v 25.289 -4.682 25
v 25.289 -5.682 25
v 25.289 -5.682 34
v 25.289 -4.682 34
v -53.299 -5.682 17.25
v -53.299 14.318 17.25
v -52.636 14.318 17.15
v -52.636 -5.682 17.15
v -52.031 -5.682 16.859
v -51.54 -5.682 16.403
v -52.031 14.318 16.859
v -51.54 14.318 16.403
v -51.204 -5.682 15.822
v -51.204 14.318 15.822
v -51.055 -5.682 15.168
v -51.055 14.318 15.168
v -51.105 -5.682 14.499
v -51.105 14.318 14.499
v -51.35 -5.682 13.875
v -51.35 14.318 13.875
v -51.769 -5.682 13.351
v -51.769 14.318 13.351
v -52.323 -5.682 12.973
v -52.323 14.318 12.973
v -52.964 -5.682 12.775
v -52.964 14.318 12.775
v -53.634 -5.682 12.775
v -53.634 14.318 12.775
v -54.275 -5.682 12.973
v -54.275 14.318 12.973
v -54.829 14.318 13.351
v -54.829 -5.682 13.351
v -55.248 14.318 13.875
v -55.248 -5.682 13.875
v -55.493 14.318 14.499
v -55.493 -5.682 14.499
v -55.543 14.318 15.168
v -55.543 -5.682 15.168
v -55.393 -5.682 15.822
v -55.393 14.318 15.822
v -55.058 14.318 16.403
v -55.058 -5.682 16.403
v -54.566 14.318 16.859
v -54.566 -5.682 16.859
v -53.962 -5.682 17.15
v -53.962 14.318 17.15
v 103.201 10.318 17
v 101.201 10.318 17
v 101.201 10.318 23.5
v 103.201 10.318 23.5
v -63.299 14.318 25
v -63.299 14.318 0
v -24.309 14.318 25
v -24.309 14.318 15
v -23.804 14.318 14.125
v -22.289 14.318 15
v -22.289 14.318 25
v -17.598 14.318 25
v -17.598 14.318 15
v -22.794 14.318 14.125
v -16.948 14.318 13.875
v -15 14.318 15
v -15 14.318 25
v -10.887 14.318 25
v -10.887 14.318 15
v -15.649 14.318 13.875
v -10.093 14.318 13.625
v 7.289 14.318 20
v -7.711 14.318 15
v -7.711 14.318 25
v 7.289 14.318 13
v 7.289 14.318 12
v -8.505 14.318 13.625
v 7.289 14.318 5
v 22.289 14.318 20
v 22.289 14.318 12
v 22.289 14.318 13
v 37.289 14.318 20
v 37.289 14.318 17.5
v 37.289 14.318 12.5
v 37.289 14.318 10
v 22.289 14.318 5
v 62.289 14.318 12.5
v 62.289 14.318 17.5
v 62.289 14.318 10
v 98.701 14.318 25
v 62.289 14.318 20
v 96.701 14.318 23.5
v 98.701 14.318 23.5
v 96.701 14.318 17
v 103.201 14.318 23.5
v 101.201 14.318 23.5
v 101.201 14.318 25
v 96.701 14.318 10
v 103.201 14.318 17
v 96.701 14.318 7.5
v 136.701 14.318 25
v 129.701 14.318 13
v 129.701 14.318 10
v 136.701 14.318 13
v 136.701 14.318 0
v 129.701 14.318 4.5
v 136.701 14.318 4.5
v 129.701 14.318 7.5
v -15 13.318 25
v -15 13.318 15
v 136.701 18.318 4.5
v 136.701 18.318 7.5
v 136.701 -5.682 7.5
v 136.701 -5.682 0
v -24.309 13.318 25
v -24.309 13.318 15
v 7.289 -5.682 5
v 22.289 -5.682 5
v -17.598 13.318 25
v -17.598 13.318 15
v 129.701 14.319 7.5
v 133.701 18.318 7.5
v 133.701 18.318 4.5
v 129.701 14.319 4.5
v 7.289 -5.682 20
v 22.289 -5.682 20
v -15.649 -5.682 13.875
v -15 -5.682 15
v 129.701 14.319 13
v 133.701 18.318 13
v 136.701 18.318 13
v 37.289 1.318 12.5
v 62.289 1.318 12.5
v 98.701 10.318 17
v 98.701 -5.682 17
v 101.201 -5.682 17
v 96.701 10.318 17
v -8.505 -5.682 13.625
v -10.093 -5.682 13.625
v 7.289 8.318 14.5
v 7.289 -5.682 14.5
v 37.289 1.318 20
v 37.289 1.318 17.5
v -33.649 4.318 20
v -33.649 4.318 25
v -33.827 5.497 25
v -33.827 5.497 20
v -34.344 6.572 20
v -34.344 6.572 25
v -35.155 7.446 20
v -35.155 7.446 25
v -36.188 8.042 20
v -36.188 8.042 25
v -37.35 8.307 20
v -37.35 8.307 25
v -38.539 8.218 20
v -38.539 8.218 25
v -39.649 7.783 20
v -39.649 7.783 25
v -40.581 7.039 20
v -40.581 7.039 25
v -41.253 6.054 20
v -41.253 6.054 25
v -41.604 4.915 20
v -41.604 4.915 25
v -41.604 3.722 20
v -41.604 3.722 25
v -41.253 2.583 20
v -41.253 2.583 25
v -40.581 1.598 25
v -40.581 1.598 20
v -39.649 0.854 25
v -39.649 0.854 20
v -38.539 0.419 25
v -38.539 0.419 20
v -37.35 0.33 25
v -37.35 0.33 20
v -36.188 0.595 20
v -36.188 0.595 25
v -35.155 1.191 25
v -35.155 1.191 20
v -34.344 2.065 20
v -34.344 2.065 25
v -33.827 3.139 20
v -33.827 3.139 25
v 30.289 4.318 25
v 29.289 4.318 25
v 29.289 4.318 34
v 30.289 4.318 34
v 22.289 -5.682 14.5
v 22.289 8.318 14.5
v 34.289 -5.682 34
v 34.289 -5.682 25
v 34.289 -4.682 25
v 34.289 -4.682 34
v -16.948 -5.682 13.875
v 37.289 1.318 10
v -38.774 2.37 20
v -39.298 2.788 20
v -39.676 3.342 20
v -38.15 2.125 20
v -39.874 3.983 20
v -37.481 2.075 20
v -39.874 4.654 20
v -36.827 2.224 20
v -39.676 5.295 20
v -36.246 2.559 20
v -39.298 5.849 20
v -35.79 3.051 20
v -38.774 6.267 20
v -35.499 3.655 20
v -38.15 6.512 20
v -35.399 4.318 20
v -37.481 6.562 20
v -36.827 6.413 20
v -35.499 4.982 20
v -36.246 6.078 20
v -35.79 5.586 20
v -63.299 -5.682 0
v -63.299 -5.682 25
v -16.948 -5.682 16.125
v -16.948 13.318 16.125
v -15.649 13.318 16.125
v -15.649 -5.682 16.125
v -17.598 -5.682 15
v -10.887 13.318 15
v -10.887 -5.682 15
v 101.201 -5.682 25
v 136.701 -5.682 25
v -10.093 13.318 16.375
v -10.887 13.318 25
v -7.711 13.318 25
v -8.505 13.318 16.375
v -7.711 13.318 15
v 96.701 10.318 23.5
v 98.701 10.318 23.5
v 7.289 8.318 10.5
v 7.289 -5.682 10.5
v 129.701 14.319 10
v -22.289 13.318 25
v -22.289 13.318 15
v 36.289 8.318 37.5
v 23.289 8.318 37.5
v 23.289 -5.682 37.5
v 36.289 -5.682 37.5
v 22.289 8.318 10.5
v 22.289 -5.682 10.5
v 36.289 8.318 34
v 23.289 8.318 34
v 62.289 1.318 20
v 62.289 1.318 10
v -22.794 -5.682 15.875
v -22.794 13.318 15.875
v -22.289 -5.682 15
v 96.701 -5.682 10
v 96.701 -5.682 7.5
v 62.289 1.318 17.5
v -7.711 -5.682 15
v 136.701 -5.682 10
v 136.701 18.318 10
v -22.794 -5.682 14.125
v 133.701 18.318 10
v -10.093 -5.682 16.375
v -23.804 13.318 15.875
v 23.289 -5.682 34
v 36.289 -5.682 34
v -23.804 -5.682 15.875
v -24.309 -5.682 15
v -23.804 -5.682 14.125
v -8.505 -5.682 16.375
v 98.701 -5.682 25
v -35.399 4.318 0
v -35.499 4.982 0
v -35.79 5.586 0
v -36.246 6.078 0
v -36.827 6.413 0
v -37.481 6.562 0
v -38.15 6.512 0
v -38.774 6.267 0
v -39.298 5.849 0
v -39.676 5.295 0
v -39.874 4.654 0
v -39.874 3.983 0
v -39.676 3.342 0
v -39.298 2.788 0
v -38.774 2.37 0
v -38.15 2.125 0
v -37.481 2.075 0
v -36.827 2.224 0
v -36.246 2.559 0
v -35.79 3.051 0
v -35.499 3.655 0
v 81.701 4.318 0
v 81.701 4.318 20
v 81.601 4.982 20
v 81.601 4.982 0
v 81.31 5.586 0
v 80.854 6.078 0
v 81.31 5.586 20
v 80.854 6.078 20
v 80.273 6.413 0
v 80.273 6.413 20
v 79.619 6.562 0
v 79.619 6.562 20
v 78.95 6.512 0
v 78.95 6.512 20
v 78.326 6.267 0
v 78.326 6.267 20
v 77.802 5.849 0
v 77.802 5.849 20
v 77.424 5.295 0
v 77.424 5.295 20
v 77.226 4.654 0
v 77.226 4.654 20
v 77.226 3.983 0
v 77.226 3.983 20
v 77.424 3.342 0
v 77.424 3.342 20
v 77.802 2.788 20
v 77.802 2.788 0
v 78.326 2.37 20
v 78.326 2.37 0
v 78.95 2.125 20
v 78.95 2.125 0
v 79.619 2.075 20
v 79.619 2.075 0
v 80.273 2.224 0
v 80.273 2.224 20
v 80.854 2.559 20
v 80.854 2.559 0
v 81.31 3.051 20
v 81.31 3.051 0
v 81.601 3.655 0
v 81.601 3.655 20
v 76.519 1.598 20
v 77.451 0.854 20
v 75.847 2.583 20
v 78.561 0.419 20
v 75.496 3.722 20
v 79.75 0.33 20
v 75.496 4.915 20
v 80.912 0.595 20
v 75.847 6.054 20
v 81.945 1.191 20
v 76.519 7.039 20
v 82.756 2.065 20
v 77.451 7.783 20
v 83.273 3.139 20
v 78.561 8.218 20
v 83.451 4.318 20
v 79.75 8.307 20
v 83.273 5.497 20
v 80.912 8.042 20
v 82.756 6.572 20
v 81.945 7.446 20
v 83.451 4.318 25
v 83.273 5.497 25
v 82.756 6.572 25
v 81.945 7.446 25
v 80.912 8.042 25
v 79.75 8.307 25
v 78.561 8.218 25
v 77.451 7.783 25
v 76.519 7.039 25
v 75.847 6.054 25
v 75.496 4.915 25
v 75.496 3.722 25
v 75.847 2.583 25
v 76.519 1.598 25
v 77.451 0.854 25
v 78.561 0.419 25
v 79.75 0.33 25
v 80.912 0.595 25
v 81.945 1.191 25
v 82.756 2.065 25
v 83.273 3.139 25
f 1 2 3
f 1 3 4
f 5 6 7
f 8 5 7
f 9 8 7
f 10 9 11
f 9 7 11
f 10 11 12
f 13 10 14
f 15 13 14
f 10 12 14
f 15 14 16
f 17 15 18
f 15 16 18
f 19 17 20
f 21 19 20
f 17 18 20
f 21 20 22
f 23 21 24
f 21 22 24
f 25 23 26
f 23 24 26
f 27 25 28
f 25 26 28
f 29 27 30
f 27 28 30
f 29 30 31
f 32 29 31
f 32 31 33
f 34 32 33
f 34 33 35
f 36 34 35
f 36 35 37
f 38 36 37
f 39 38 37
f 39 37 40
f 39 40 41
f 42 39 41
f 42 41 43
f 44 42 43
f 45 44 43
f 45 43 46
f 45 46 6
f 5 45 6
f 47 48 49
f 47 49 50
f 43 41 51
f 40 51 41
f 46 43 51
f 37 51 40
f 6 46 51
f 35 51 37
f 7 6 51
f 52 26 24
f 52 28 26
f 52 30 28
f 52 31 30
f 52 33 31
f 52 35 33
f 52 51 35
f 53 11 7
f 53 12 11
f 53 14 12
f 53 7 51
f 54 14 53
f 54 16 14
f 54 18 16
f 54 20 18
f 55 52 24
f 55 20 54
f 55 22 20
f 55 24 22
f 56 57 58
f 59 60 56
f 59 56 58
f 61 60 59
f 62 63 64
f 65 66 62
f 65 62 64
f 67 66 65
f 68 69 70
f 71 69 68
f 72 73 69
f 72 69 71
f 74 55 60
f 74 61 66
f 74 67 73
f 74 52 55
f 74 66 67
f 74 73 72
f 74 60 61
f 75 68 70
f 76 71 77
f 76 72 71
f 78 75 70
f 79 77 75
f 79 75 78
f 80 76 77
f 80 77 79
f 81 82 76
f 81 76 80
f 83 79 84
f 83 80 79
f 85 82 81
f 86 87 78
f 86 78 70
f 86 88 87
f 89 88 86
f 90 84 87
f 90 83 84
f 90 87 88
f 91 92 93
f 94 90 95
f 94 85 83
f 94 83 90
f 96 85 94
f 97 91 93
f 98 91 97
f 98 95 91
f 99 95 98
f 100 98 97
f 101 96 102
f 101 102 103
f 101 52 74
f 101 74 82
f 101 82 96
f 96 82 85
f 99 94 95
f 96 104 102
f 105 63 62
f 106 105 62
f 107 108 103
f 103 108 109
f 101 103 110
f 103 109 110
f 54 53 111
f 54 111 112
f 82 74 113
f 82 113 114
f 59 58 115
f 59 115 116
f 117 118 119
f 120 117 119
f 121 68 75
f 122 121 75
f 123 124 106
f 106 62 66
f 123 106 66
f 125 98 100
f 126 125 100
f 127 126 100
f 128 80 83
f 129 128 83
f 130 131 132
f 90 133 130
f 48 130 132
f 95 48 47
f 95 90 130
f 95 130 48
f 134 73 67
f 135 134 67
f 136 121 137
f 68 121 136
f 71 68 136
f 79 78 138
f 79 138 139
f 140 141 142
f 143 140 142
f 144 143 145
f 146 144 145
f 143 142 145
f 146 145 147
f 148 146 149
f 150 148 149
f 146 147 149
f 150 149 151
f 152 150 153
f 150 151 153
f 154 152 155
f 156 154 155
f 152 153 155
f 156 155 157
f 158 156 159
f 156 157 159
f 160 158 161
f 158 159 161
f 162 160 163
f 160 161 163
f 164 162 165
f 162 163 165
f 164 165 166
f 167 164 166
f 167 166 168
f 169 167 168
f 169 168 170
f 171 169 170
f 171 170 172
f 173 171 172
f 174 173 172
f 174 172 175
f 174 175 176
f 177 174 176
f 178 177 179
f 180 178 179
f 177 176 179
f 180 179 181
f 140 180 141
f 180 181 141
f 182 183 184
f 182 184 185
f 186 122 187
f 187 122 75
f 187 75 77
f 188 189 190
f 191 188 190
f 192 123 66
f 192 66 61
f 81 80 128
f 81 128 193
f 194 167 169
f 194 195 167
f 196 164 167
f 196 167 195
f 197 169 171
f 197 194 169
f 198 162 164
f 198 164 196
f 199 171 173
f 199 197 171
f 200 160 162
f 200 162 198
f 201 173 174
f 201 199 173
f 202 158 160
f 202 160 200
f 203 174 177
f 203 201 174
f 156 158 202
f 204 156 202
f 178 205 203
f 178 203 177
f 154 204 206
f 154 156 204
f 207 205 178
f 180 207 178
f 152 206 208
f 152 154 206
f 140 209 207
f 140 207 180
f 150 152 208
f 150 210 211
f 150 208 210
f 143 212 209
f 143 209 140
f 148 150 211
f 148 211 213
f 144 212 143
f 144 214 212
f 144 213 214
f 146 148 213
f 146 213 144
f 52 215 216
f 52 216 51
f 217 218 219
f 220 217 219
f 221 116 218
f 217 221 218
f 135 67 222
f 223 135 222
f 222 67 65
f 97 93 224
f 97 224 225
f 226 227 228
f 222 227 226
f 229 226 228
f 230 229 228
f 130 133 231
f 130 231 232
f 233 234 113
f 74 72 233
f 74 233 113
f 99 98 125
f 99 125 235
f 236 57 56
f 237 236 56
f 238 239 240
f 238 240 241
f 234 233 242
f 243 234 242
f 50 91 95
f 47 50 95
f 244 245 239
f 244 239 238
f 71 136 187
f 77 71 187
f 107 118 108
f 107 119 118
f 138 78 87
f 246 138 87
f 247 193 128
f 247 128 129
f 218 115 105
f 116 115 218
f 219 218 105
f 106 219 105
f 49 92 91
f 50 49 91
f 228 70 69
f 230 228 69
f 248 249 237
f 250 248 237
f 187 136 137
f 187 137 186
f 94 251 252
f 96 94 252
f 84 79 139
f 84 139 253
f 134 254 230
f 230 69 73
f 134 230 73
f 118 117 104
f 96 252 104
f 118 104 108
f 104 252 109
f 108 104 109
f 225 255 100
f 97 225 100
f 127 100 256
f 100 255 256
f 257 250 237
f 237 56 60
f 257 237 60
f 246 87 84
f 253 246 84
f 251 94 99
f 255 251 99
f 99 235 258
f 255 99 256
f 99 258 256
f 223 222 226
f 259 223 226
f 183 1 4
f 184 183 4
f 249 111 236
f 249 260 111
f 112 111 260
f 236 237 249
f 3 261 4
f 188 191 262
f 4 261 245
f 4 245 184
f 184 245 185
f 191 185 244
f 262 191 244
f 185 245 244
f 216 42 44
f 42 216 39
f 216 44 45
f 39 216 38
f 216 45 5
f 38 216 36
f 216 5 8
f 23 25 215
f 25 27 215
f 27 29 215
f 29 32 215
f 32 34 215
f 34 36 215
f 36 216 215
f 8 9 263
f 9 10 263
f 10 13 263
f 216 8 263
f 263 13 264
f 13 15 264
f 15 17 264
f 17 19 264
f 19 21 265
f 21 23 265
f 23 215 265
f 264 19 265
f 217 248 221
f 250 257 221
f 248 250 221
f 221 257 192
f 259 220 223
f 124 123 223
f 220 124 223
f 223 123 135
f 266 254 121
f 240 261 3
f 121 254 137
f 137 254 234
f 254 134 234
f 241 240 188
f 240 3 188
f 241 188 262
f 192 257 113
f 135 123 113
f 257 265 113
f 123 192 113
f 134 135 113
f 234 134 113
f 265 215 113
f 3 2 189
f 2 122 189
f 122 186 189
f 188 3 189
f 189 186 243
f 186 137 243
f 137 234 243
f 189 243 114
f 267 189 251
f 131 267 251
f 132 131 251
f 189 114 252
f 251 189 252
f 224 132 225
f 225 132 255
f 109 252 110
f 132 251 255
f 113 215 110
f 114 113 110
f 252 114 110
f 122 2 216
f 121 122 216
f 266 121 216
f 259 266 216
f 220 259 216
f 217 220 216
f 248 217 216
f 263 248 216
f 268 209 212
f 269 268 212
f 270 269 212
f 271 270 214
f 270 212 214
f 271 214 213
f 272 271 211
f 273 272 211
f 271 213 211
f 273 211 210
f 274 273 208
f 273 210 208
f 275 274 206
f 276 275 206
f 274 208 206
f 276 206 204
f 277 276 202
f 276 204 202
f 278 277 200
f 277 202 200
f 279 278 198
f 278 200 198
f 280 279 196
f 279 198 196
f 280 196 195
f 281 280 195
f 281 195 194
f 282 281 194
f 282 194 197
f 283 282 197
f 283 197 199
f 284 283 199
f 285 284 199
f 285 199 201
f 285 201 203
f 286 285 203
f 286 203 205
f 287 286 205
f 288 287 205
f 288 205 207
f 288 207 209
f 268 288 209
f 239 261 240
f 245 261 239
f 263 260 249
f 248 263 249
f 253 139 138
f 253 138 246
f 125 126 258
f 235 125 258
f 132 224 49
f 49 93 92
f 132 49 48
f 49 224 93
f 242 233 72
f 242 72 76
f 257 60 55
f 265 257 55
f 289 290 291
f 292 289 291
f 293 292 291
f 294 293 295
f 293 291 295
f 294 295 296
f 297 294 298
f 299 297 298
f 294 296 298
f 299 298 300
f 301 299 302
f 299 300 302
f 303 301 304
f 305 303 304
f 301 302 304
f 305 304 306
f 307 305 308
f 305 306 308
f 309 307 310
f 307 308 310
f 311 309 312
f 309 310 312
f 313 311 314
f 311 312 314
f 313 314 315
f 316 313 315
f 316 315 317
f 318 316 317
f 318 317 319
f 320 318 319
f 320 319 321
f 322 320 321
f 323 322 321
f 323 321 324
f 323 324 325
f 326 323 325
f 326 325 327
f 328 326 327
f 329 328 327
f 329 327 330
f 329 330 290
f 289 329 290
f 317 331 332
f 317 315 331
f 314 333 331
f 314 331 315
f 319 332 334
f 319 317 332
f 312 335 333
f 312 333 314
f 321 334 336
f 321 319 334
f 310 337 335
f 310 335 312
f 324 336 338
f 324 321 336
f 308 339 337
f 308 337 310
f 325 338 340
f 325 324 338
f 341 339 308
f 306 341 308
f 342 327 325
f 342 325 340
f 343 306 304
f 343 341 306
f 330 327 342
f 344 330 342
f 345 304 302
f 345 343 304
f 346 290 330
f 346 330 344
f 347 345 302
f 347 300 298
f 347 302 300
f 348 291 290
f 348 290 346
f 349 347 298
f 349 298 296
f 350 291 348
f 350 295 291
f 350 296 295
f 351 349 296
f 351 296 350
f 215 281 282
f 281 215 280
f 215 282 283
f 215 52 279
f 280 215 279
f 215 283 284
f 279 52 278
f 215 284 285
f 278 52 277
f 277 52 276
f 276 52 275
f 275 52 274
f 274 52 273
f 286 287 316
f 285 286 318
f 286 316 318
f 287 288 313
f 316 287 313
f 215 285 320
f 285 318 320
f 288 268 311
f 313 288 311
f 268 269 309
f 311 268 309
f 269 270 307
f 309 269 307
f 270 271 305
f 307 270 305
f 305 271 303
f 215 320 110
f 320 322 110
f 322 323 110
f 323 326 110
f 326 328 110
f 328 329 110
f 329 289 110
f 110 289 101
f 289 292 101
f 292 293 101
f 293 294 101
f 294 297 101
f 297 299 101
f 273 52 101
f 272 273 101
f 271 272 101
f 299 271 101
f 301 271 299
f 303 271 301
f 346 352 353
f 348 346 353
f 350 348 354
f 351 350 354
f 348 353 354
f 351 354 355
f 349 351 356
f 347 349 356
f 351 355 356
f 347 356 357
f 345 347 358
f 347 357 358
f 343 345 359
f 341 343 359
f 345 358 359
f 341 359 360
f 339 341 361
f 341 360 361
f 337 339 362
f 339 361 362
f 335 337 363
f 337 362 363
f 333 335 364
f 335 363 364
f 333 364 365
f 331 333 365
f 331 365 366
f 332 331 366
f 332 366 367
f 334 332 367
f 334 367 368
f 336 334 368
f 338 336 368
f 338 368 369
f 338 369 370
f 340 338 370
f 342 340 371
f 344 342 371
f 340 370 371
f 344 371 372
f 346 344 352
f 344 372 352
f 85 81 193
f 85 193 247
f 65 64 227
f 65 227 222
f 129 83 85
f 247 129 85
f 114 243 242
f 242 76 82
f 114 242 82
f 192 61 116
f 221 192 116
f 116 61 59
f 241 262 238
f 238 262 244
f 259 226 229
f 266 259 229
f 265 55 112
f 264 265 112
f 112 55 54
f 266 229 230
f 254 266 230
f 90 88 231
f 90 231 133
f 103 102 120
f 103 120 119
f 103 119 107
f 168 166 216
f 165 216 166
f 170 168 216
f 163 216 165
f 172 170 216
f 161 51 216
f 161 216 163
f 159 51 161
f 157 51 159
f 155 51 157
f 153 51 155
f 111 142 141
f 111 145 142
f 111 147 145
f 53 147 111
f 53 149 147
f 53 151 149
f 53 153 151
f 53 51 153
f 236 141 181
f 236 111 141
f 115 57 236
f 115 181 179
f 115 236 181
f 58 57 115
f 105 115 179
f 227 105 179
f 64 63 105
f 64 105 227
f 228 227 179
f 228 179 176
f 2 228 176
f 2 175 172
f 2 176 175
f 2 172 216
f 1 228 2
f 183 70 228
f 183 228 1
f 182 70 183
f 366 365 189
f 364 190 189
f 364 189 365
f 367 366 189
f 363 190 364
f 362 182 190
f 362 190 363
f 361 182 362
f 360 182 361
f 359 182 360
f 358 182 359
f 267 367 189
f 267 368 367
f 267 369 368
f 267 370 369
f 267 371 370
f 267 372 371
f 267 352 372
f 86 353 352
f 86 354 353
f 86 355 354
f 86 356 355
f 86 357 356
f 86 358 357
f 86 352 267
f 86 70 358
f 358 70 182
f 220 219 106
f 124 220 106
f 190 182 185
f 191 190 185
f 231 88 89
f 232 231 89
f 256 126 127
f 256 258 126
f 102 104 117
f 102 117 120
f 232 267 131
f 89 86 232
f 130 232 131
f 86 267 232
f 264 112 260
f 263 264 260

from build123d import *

# Parameters (mm, degrees)
SCHIZZO1_W                    = 200
SCHIZZO1_H                    = 20
ESTRUSIONE_ESTRUSIONE1_DEPTH  = 25
SCHIZZO2_R                    = 2.25
TAGLIO_ESTRUSIONE1_DEPTH      = 141.400046302
SCHIZZO4_W                    = 2.020725942
SCHIZZO4_H                    = 10
SCHIZZO4_W_2                  = 2.598076211
SCHIZZO4_W_3                  = 3.175426481
TAGLIO_ESTRUSIONE2_DEPTH      = 1
SCHIZZO7_W                    = 15
SCHIZZO7_H                    = 5.5
TAGLIO_ESTRUSIONE3_DEPTH      = 141.400046302
SMUSSO1_SIZE                  = 1.5
SMUSSO1_SIZE2                 = 6
SCHIZZO8_W                    = 25
SCHIZZO8_H                    = 2.5
TAGLIO_ESTRUSIONE4_DEPTH      = 13
SCHIZZO9_W                    = 40
SCHIZZO9_H                    = 2.5
TAGLIO_ESTRUSIONE5_DEPTH      = 141.400046302
SCHIZZO10_W                   = 7
SCHIZZO10_H                   = 3
ESTRUSIONE_ESTRUSIONE5_DEPTH  = 4
SMUSSO2_SIZE                  = 4
SCHIZZO11_W                   = 2.5
SCHIZZO11_H                   = 8
TAGLIO_ESTRUSIONE6_DEPTH      = 141.400046302
SCHIZZO12_W                   = 6.5
SCHIZZO12_H                   = 6.5
TAGLIO_ESTRUSIONE7_DEPTH      = 4
SCHIZZO13_W                   = 9
SCHIZZO13_H                   = 10
ESTRUSIONE_ESTRUSIONE9_DEPTH  = 9
SCHIZZO14_W                   = 13
SCHIZZO14_H                   = 14
ESTRUSIONE_ESTRUSIONE10_DEPTH = 3.5
SMUSSO3_SIZE                  = 9
SMUSSO3_SIZE2                 = 4
SMUSSO4_SIZE                  = 4
SMUSSO4_SIZE2                 = 9
SCHIZZO16_R                   = 2.25
TAGLIO_ESTRUSIONE8_DEPTH      = 141.17038757
SCHIZZO17_R                   = 4
TAGLIO_ESTRUSIONE9_DEPTH      = 5


with BuildPart() as part:
    # Schizzo1 → Estrusione-Estrusione1 (new body)
    with BuildSketch(Plane.XY):
        with Locations((36.701035116, 4.318421053)):
            Rectangle(SCHIZZO1_W, SCHIZZO1_H)
    extrude(amount=ESTRUSIONE_ESTRUSIONE1_DEPTH)

    # Schizzo2 → Taglio-Estrusione1 (cut, through all)
    with BuildSketch(Plane(origin=(0, 14.318421053, 0), x_dir=(1, 0, 0), z_dir=(0, 1, 0))):
        with Locations(Location((-53.298964884, -15, 0), (0, 0, 270))):
            Circle(SCHIZZO2_R)
        Polygon((-23.80414637, -15.875), (-22.793783399, -15.875), (-22.288601913, -15), (-22.793783399, -14.125), (-23.80414637, -14.125), (-24.309327855, -15), align=None)
        Polygon((-14.999926779, -15), (-15.649445831, -13.875), (-16.948483937, -13.875), (-17.59800299, -15), (-16.948483937, -16.125), (-15.649445831, -16.125), align=None)
        Polygon((-8.505108264, -16.375), (-7.711251644, -15), (-8.505108264, -13.625), (-10.092821504, -13.625), (-10.886678125, -15), (-10.092821504, -16.375), align=None)
    extrude(amount=-TAGLIO_ESTRUSIONE1_DEPTH, mode=Mode.SUBTRACT)

    # Schizzo4 → Taglio-Estrusione2 (cut)
    with BuildSketch(Plane(origin=(0, 14.318421053, 0), x_dir=(1, 0, 0), z_dir=(0, 1, 0))):
        with Locations((-23.298964884, -20)):
            Rectangle(SCHIZZO4_W, SCHIZZO4_H)
        with Locations((-16.298964885, -20)):
            Rectangle(SCHIZZO4_W_2, SCHIZZO4_H)
        with Locations((-9.298964885, -20)):
            Rectangle(SCHIZZO4_W_3, SCHIZZO4_H)
    extrude(amount=-TAGLIO_ESTRUSIONE2_DEPTH, mode=Mode.SUBTRACT)

    # Schizzo7 → Taglio-Estrusione3 (cut, through all)
    with BuildSketch(Plane(origin=(0, 14.318421053, 0), x_dir=(1, 0, 0), z_dir=(0, 1, 0))):
        with Locations((14.788748356, -17.25)):
            Rectangle(SCHIZZO7_W, SCHIZZO7_H)
        with Locations((14.788748356, -7.75)):
            Rectangle(SCHIZZO7_W, SCHIZZO7_H)
    extrude(amount=-TAGLIO_ESTRUSIONE3_DEPTH, mode=Mode.SUBTRACT)

    # Smusso1
    smusso1_edges = [part.edges().sort_by_distance(p)[0] for p in [
        (14.788748356, 14.318421053, 14.5),
        (14.788748356, 14.318421053, 10.5),
    ]]
    smusso1_side = [part.faces().sort_by_distance(p)[0] for p in [
        (38.695689024, 14.318421053, 12.36530447),
    ]]
    chamfer(smusso1_edges, length=SMUSSO1_SIZE, length2=SMUSSO1_SIZE2, reference=smusso1_side[0])

    # Schizzo8 → Taglio-Estrusione4 (cut)
    with BuildSketch(Plane(origin=(0, 14.318421053, 0), x_dir=(1, 0, 0), z_dir=(0, 1, 0))):
        with Locations((49.788748356, -18.75)):
            Rectangle(SCHIZZO8_W, SCHIZZO8_H)
        with Locations((49.788748356, -11.25)):
            Rectangle(SCHIZZO8_W, SCHIZZO8_H)
    extrude(amount=-TAGLIO_ESTRUSIONE4_DEPTH, mode=Mode.SUBTRACT)

    # Schizzo9 → Taglio-Estrusione5 (cut, through all)
    with BuildSketch(Plane(origin=(0, 14.318421053, 0), x_dir=(1, 0, 0), z_dir=(0, 1, 0))):
        with Locations((116.701035116, -8.75)):
            Rectangle(SCHIZZO9_W, SCHIZZO9_H)
    extrude(amount=-TAGLIO_ESTRUSIONE5_DEPTH, mode=Mode.SUBTRACT)

    # Schizzo10 → Estrusione-Estrusione5 (add)
    with BuildSketch(Plane(origin=(0, 14.318421053, 0), x_dir=(1, 0, 0), z_dir=(0, 1, 0))):
        with Locations((133.201035116, -6)):
            Rectangle(SCHIZZO10_W, SCHIZZO10_H)
        with Locations((133.201035116, -11.5)):
            Rectangle(SCHIZZO10_W, SCHIZZO10_H)
    extrude(amount=ESTRUSIONE_ESTRUSIONE5_DEPTH)

    # Smusso2
    smusso2_edges = [part.edges().sort_by_distance(p)[0] for p in [
        (129.701035116, 18.318421053, 11.5),
        (129.701035116, 18.318421053, 6),
    ]]
    chamfer(smusso2_edges, length=SMUSSO2_SIZE - 0.0001)  # a hair under: the kernel refuses the full size

    # Schizzo11 → Taglio-Estrusione6 (cut, through all)
    with BuildSketch(Plane(origin=(0, 14.318421053, 0), x_dir=(1, 0, 0), z_dir=(0, 1, 0))):
        with Locations((99.951035116, -21)):
            Rectangle(SCHIZZO11_W, SCHIZZO11_H)
    extrude(amount=-TAGLIO_ESTRUSIONE6_DEPTH, mode=Mode.SUBTRACT)

    # Schizzo12 → Taglio-Estrusione7 (cut)
    with BuildSketch(Plane(origin=(0, 14.318421053, 0), x_dir=(1, 0, 0), z_dir=(0, 1, 0))):
        with Locations((99.951035116, -20.25)):
            Rectangle(SCHIZZO12_W, SCHIZZO12_H)
    extrude(amount=-TAGLIO_ESTRUSIONE7_DEPTH, mode=Mode.SUBTRACT)

    # Schizzo13 → Estrusione-Estrusione9 (add)
    with BuildSketch(Plane.XY.offset(25)):
        with Locations((29.788748356, -0.681578947)):
            Rectangle(SCHIZZO13_W, SCHIZZO13_H)
    extrude(amount=ESTRUSIONE_ESTRUSIONE9_DEPTH)

    # Schizzo14 → Estrusione-Estrusione10 (add)
    with BuildSketch(Plane.XY.offset(34)):
        with Locations((29.788748356, 1.318421053)):
            Rectangle(SCHIZZO14_W, SCHIZZO14_H)
    extrude(amount=ESTRUSIONE_ESTRUSIONE10_DEPTH)

    # Smusso3
    smusso3_edges = [part.edges().sort_by_distance(p)[0] for p in [
        (34.288748356, 4.318421053, 29.5),
    ]]
    smusso3_side = [part.faces().sort_by_distance(p)[0] for p in [
        (34.288748356, -0.681578947, 29.5),
    ]]
    chamfer(smusso3_edges, length=SMUSSO3_SIZE, length2=SMUSSO3_SIZE2, reference=smusso3_side[0])

    # Smusso4
    smusso4_edges = [part.edges().sort_by_distance(p)[0] for p in [
        (25.288748356, 4.318421053, 29.5),
    ]]
    smusso4_side = [part.faces().sort_by_distance(p)[0] for p in [
        (27.788748356, 4.318421053, 29.5),
    ]]
    chamfer(smusso4_edges, length=SMUSSO4_SIZE, length2=SMUSSO4_SIZE2, reference=smusso4_side[0])

    # Schizzo16 → Taglio-Estrusione8 (cut, through all)
    with BuildSketch(Plane.XY.offset(25)):
        with Locations((-37.648964884, 4.318421053)):
            Circle(SCHIZZO16_R)
        with Locations((79.451035116, 4.318421053)):
            Circle(SCHIZZO16_R)
    extrude(amount=-TAGLIO_ESTRUSIONE8_DEPTH, mode=Mode.SUBTRACT)

    # Schizzo17 → Taglio-Estrusione9 (cut)
    with BuildSketch(Plane.XY.offset(25)):
        with Locations((-37.648964884, 4.318421053)):
            Circle(SCHIZZO17_R)
        with Locations((79.451035116, 4.318421053)):
            Circle(SCHIZZO17_R)
    extrude(amount=-TAGLIO_ESTRUSIONE9_DEPTH, mode=Mode.SUBTRACT)


solid = part.part
